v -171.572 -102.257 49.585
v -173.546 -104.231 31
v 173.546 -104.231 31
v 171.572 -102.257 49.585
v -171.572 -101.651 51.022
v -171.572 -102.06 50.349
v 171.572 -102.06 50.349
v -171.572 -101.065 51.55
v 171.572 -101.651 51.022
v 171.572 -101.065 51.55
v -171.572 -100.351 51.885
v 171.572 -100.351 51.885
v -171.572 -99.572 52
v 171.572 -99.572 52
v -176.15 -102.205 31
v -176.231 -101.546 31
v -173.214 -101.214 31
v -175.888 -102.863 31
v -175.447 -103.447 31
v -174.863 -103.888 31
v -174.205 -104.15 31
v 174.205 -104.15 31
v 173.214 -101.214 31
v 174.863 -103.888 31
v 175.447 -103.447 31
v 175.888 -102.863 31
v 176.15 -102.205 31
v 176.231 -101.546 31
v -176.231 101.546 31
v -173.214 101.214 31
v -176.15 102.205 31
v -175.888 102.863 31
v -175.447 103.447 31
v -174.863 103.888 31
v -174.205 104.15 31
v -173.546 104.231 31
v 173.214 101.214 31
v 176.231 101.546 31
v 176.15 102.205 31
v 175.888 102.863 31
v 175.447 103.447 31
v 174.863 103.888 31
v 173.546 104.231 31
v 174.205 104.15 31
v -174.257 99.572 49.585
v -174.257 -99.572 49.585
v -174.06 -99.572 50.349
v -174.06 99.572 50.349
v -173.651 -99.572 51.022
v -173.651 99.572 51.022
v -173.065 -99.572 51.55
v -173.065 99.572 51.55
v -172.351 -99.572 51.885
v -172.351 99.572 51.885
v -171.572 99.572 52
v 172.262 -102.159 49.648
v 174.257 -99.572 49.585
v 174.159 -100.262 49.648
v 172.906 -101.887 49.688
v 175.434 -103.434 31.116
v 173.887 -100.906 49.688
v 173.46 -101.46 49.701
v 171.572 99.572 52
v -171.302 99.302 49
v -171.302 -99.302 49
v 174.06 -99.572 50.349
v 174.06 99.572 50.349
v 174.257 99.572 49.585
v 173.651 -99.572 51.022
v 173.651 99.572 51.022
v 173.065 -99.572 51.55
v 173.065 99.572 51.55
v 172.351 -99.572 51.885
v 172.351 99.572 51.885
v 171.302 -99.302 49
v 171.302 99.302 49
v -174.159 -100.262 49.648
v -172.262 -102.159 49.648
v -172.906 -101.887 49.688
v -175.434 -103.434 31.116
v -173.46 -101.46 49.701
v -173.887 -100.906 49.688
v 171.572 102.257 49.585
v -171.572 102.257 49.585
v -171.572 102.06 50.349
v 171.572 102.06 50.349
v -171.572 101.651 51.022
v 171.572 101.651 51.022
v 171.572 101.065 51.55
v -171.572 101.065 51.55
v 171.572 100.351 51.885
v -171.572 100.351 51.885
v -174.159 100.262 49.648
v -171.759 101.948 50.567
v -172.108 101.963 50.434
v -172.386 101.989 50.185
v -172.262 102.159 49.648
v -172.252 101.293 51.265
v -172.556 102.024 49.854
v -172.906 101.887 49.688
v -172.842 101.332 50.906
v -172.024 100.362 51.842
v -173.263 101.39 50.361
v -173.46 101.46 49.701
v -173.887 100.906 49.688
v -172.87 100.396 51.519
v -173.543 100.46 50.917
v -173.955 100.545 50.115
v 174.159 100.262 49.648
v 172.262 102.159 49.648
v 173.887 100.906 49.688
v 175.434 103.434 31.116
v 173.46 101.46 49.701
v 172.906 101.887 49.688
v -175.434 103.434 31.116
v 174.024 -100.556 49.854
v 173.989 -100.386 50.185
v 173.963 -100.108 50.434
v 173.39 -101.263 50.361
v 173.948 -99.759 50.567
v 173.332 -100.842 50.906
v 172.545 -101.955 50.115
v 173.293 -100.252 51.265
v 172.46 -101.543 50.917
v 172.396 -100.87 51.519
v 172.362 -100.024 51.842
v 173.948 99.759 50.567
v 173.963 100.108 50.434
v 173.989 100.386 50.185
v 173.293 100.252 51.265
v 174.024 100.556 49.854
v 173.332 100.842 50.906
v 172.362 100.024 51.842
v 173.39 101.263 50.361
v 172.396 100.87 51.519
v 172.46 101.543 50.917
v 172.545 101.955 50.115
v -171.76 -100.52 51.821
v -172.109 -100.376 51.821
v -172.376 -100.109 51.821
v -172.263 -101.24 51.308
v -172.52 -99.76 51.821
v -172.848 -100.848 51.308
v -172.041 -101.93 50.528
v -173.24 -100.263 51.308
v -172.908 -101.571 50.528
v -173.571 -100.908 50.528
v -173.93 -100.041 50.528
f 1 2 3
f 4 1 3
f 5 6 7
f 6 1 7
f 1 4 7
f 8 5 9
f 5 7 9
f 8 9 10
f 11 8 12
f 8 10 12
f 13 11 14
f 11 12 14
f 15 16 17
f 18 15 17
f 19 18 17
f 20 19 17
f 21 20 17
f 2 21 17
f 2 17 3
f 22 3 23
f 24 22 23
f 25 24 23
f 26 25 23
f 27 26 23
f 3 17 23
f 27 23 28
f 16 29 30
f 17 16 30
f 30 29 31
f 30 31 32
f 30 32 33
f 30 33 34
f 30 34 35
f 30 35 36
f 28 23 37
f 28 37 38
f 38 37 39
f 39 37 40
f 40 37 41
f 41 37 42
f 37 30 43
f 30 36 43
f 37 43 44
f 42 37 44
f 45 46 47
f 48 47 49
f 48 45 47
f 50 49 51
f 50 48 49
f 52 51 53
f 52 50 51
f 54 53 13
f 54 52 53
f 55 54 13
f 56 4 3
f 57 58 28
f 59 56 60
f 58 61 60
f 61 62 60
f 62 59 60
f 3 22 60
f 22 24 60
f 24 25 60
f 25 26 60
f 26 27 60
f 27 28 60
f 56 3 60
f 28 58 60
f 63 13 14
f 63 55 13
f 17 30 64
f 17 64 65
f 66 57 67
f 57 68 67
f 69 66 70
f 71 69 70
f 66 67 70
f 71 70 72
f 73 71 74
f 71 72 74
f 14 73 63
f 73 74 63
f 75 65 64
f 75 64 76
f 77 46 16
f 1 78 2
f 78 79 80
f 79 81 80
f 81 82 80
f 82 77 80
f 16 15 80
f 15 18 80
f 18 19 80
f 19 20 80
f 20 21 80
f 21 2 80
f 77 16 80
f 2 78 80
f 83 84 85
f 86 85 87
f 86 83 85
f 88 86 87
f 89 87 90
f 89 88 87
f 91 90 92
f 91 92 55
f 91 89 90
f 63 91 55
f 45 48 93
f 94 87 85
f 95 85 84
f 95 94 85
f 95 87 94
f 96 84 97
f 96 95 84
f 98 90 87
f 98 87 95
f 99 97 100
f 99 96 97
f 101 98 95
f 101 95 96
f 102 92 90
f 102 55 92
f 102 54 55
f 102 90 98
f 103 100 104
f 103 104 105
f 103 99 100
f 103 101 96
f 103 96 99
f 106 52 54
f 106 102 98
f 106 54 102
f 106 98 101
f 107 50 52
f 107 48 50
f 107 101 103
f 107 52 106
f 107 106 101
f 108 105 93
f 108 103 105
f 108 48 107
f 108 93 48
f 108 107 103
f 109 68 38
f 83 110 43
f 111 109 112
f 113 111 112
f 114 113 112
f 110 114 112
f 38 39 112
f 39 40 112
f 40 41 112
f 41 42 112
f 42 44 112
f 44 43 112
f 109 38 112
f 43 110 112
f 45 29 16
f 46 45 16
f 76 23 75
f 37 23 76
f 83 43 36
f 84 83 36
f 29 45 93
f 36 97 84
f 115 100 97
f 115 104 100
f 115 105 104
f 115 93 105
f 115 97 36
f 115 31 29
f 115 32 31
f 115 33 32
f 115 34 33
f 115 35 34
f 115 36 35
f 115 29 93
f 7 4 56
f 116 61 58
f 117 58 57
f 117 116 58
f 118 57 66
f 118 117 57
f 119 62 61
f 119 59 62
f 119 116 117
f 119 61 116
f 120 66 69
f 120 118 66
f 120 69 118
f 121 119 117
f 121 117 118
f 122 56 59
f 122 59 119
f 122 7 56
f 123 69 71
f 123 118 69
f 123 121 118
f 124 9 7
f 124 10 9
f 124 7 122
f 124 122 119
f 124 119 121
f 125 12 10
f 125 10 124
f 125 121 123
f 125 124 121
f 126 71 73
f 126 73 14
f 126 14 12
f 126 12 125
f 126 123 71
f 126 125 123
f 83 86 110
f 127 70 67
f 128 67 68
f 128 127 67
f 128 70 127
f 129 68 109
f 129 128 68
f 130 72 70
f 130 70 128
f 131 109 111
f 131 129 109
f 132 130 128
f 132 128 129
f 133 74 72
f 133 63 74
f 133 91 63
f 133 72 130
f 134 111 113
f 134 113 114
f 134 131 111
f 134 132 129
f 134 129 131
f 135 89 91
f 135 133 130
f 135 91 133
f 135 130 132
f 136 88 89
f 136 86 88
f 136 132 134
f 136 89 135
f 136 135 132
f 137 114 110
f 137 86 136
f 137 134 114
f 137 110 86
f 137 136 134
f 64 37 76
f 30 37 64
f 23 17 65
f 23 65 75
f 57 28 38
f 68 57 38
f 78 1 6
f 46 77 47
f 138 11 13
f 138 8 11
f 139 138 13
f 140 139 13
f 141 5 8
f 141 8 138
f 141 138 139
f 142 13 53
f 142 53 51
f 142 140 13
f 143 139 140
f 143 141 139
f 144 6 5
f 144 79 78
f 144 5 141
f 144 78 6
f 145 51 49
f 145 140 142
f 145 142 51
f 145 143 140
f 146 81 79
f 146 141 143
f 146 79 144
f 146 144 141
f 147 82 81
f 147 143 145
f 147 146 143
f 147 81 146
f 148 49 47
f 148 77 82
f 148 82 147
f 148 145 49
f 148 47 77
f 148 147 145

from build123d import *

# Parameters (mm, degrees)
SKETCH002_W = 348
SKETCH002_H = 204
SKETCH001_W = 352.462198
SKETCH001_H = 208.462198
THICKNESS_T = -3
FILLET_R    = 2.7


with BuildPart() as part:
    # Sketch002 → AdditiveLoft section 0
    with BuildSketch(Plane.XY.offset(52)):
        Rectangle(SKETCH002_W, SKETCH002_H)
    # Sketch001 → AdditiveLoft section 1
    with BuildSketch(Plane.XY.offset(31)):
        Rectangle(SKETCH001_W, SKETCH001_H)
    loft()

    # Thickness
    thickness_openings = [part.faces().sort_by_distance(p)[0] for p in [
        (0, 0, 31),
    ]]
    offset(amount=THICKNESS_T, openings=thickness_openings, kind=Kind.INTERSECTION)

    # Fillet
    fillet_edges = [part.edges().sort_by_distance(p)[0] for p in [
        (-175.115549, -103.115549, 41.5),
        (0, -102, 52),
        (-174, 0, 52),
        (0, 102, 52),
        (175.115549, -103.115549, 41.5),
        (174, 0, 52),
        (175.115549, 103.115549, 41.5),
        (-175.115549, 103.115549, 41.5),
    ]]
    fillet(fillet_edges, radius=FILLET_R)


solid = part.part
